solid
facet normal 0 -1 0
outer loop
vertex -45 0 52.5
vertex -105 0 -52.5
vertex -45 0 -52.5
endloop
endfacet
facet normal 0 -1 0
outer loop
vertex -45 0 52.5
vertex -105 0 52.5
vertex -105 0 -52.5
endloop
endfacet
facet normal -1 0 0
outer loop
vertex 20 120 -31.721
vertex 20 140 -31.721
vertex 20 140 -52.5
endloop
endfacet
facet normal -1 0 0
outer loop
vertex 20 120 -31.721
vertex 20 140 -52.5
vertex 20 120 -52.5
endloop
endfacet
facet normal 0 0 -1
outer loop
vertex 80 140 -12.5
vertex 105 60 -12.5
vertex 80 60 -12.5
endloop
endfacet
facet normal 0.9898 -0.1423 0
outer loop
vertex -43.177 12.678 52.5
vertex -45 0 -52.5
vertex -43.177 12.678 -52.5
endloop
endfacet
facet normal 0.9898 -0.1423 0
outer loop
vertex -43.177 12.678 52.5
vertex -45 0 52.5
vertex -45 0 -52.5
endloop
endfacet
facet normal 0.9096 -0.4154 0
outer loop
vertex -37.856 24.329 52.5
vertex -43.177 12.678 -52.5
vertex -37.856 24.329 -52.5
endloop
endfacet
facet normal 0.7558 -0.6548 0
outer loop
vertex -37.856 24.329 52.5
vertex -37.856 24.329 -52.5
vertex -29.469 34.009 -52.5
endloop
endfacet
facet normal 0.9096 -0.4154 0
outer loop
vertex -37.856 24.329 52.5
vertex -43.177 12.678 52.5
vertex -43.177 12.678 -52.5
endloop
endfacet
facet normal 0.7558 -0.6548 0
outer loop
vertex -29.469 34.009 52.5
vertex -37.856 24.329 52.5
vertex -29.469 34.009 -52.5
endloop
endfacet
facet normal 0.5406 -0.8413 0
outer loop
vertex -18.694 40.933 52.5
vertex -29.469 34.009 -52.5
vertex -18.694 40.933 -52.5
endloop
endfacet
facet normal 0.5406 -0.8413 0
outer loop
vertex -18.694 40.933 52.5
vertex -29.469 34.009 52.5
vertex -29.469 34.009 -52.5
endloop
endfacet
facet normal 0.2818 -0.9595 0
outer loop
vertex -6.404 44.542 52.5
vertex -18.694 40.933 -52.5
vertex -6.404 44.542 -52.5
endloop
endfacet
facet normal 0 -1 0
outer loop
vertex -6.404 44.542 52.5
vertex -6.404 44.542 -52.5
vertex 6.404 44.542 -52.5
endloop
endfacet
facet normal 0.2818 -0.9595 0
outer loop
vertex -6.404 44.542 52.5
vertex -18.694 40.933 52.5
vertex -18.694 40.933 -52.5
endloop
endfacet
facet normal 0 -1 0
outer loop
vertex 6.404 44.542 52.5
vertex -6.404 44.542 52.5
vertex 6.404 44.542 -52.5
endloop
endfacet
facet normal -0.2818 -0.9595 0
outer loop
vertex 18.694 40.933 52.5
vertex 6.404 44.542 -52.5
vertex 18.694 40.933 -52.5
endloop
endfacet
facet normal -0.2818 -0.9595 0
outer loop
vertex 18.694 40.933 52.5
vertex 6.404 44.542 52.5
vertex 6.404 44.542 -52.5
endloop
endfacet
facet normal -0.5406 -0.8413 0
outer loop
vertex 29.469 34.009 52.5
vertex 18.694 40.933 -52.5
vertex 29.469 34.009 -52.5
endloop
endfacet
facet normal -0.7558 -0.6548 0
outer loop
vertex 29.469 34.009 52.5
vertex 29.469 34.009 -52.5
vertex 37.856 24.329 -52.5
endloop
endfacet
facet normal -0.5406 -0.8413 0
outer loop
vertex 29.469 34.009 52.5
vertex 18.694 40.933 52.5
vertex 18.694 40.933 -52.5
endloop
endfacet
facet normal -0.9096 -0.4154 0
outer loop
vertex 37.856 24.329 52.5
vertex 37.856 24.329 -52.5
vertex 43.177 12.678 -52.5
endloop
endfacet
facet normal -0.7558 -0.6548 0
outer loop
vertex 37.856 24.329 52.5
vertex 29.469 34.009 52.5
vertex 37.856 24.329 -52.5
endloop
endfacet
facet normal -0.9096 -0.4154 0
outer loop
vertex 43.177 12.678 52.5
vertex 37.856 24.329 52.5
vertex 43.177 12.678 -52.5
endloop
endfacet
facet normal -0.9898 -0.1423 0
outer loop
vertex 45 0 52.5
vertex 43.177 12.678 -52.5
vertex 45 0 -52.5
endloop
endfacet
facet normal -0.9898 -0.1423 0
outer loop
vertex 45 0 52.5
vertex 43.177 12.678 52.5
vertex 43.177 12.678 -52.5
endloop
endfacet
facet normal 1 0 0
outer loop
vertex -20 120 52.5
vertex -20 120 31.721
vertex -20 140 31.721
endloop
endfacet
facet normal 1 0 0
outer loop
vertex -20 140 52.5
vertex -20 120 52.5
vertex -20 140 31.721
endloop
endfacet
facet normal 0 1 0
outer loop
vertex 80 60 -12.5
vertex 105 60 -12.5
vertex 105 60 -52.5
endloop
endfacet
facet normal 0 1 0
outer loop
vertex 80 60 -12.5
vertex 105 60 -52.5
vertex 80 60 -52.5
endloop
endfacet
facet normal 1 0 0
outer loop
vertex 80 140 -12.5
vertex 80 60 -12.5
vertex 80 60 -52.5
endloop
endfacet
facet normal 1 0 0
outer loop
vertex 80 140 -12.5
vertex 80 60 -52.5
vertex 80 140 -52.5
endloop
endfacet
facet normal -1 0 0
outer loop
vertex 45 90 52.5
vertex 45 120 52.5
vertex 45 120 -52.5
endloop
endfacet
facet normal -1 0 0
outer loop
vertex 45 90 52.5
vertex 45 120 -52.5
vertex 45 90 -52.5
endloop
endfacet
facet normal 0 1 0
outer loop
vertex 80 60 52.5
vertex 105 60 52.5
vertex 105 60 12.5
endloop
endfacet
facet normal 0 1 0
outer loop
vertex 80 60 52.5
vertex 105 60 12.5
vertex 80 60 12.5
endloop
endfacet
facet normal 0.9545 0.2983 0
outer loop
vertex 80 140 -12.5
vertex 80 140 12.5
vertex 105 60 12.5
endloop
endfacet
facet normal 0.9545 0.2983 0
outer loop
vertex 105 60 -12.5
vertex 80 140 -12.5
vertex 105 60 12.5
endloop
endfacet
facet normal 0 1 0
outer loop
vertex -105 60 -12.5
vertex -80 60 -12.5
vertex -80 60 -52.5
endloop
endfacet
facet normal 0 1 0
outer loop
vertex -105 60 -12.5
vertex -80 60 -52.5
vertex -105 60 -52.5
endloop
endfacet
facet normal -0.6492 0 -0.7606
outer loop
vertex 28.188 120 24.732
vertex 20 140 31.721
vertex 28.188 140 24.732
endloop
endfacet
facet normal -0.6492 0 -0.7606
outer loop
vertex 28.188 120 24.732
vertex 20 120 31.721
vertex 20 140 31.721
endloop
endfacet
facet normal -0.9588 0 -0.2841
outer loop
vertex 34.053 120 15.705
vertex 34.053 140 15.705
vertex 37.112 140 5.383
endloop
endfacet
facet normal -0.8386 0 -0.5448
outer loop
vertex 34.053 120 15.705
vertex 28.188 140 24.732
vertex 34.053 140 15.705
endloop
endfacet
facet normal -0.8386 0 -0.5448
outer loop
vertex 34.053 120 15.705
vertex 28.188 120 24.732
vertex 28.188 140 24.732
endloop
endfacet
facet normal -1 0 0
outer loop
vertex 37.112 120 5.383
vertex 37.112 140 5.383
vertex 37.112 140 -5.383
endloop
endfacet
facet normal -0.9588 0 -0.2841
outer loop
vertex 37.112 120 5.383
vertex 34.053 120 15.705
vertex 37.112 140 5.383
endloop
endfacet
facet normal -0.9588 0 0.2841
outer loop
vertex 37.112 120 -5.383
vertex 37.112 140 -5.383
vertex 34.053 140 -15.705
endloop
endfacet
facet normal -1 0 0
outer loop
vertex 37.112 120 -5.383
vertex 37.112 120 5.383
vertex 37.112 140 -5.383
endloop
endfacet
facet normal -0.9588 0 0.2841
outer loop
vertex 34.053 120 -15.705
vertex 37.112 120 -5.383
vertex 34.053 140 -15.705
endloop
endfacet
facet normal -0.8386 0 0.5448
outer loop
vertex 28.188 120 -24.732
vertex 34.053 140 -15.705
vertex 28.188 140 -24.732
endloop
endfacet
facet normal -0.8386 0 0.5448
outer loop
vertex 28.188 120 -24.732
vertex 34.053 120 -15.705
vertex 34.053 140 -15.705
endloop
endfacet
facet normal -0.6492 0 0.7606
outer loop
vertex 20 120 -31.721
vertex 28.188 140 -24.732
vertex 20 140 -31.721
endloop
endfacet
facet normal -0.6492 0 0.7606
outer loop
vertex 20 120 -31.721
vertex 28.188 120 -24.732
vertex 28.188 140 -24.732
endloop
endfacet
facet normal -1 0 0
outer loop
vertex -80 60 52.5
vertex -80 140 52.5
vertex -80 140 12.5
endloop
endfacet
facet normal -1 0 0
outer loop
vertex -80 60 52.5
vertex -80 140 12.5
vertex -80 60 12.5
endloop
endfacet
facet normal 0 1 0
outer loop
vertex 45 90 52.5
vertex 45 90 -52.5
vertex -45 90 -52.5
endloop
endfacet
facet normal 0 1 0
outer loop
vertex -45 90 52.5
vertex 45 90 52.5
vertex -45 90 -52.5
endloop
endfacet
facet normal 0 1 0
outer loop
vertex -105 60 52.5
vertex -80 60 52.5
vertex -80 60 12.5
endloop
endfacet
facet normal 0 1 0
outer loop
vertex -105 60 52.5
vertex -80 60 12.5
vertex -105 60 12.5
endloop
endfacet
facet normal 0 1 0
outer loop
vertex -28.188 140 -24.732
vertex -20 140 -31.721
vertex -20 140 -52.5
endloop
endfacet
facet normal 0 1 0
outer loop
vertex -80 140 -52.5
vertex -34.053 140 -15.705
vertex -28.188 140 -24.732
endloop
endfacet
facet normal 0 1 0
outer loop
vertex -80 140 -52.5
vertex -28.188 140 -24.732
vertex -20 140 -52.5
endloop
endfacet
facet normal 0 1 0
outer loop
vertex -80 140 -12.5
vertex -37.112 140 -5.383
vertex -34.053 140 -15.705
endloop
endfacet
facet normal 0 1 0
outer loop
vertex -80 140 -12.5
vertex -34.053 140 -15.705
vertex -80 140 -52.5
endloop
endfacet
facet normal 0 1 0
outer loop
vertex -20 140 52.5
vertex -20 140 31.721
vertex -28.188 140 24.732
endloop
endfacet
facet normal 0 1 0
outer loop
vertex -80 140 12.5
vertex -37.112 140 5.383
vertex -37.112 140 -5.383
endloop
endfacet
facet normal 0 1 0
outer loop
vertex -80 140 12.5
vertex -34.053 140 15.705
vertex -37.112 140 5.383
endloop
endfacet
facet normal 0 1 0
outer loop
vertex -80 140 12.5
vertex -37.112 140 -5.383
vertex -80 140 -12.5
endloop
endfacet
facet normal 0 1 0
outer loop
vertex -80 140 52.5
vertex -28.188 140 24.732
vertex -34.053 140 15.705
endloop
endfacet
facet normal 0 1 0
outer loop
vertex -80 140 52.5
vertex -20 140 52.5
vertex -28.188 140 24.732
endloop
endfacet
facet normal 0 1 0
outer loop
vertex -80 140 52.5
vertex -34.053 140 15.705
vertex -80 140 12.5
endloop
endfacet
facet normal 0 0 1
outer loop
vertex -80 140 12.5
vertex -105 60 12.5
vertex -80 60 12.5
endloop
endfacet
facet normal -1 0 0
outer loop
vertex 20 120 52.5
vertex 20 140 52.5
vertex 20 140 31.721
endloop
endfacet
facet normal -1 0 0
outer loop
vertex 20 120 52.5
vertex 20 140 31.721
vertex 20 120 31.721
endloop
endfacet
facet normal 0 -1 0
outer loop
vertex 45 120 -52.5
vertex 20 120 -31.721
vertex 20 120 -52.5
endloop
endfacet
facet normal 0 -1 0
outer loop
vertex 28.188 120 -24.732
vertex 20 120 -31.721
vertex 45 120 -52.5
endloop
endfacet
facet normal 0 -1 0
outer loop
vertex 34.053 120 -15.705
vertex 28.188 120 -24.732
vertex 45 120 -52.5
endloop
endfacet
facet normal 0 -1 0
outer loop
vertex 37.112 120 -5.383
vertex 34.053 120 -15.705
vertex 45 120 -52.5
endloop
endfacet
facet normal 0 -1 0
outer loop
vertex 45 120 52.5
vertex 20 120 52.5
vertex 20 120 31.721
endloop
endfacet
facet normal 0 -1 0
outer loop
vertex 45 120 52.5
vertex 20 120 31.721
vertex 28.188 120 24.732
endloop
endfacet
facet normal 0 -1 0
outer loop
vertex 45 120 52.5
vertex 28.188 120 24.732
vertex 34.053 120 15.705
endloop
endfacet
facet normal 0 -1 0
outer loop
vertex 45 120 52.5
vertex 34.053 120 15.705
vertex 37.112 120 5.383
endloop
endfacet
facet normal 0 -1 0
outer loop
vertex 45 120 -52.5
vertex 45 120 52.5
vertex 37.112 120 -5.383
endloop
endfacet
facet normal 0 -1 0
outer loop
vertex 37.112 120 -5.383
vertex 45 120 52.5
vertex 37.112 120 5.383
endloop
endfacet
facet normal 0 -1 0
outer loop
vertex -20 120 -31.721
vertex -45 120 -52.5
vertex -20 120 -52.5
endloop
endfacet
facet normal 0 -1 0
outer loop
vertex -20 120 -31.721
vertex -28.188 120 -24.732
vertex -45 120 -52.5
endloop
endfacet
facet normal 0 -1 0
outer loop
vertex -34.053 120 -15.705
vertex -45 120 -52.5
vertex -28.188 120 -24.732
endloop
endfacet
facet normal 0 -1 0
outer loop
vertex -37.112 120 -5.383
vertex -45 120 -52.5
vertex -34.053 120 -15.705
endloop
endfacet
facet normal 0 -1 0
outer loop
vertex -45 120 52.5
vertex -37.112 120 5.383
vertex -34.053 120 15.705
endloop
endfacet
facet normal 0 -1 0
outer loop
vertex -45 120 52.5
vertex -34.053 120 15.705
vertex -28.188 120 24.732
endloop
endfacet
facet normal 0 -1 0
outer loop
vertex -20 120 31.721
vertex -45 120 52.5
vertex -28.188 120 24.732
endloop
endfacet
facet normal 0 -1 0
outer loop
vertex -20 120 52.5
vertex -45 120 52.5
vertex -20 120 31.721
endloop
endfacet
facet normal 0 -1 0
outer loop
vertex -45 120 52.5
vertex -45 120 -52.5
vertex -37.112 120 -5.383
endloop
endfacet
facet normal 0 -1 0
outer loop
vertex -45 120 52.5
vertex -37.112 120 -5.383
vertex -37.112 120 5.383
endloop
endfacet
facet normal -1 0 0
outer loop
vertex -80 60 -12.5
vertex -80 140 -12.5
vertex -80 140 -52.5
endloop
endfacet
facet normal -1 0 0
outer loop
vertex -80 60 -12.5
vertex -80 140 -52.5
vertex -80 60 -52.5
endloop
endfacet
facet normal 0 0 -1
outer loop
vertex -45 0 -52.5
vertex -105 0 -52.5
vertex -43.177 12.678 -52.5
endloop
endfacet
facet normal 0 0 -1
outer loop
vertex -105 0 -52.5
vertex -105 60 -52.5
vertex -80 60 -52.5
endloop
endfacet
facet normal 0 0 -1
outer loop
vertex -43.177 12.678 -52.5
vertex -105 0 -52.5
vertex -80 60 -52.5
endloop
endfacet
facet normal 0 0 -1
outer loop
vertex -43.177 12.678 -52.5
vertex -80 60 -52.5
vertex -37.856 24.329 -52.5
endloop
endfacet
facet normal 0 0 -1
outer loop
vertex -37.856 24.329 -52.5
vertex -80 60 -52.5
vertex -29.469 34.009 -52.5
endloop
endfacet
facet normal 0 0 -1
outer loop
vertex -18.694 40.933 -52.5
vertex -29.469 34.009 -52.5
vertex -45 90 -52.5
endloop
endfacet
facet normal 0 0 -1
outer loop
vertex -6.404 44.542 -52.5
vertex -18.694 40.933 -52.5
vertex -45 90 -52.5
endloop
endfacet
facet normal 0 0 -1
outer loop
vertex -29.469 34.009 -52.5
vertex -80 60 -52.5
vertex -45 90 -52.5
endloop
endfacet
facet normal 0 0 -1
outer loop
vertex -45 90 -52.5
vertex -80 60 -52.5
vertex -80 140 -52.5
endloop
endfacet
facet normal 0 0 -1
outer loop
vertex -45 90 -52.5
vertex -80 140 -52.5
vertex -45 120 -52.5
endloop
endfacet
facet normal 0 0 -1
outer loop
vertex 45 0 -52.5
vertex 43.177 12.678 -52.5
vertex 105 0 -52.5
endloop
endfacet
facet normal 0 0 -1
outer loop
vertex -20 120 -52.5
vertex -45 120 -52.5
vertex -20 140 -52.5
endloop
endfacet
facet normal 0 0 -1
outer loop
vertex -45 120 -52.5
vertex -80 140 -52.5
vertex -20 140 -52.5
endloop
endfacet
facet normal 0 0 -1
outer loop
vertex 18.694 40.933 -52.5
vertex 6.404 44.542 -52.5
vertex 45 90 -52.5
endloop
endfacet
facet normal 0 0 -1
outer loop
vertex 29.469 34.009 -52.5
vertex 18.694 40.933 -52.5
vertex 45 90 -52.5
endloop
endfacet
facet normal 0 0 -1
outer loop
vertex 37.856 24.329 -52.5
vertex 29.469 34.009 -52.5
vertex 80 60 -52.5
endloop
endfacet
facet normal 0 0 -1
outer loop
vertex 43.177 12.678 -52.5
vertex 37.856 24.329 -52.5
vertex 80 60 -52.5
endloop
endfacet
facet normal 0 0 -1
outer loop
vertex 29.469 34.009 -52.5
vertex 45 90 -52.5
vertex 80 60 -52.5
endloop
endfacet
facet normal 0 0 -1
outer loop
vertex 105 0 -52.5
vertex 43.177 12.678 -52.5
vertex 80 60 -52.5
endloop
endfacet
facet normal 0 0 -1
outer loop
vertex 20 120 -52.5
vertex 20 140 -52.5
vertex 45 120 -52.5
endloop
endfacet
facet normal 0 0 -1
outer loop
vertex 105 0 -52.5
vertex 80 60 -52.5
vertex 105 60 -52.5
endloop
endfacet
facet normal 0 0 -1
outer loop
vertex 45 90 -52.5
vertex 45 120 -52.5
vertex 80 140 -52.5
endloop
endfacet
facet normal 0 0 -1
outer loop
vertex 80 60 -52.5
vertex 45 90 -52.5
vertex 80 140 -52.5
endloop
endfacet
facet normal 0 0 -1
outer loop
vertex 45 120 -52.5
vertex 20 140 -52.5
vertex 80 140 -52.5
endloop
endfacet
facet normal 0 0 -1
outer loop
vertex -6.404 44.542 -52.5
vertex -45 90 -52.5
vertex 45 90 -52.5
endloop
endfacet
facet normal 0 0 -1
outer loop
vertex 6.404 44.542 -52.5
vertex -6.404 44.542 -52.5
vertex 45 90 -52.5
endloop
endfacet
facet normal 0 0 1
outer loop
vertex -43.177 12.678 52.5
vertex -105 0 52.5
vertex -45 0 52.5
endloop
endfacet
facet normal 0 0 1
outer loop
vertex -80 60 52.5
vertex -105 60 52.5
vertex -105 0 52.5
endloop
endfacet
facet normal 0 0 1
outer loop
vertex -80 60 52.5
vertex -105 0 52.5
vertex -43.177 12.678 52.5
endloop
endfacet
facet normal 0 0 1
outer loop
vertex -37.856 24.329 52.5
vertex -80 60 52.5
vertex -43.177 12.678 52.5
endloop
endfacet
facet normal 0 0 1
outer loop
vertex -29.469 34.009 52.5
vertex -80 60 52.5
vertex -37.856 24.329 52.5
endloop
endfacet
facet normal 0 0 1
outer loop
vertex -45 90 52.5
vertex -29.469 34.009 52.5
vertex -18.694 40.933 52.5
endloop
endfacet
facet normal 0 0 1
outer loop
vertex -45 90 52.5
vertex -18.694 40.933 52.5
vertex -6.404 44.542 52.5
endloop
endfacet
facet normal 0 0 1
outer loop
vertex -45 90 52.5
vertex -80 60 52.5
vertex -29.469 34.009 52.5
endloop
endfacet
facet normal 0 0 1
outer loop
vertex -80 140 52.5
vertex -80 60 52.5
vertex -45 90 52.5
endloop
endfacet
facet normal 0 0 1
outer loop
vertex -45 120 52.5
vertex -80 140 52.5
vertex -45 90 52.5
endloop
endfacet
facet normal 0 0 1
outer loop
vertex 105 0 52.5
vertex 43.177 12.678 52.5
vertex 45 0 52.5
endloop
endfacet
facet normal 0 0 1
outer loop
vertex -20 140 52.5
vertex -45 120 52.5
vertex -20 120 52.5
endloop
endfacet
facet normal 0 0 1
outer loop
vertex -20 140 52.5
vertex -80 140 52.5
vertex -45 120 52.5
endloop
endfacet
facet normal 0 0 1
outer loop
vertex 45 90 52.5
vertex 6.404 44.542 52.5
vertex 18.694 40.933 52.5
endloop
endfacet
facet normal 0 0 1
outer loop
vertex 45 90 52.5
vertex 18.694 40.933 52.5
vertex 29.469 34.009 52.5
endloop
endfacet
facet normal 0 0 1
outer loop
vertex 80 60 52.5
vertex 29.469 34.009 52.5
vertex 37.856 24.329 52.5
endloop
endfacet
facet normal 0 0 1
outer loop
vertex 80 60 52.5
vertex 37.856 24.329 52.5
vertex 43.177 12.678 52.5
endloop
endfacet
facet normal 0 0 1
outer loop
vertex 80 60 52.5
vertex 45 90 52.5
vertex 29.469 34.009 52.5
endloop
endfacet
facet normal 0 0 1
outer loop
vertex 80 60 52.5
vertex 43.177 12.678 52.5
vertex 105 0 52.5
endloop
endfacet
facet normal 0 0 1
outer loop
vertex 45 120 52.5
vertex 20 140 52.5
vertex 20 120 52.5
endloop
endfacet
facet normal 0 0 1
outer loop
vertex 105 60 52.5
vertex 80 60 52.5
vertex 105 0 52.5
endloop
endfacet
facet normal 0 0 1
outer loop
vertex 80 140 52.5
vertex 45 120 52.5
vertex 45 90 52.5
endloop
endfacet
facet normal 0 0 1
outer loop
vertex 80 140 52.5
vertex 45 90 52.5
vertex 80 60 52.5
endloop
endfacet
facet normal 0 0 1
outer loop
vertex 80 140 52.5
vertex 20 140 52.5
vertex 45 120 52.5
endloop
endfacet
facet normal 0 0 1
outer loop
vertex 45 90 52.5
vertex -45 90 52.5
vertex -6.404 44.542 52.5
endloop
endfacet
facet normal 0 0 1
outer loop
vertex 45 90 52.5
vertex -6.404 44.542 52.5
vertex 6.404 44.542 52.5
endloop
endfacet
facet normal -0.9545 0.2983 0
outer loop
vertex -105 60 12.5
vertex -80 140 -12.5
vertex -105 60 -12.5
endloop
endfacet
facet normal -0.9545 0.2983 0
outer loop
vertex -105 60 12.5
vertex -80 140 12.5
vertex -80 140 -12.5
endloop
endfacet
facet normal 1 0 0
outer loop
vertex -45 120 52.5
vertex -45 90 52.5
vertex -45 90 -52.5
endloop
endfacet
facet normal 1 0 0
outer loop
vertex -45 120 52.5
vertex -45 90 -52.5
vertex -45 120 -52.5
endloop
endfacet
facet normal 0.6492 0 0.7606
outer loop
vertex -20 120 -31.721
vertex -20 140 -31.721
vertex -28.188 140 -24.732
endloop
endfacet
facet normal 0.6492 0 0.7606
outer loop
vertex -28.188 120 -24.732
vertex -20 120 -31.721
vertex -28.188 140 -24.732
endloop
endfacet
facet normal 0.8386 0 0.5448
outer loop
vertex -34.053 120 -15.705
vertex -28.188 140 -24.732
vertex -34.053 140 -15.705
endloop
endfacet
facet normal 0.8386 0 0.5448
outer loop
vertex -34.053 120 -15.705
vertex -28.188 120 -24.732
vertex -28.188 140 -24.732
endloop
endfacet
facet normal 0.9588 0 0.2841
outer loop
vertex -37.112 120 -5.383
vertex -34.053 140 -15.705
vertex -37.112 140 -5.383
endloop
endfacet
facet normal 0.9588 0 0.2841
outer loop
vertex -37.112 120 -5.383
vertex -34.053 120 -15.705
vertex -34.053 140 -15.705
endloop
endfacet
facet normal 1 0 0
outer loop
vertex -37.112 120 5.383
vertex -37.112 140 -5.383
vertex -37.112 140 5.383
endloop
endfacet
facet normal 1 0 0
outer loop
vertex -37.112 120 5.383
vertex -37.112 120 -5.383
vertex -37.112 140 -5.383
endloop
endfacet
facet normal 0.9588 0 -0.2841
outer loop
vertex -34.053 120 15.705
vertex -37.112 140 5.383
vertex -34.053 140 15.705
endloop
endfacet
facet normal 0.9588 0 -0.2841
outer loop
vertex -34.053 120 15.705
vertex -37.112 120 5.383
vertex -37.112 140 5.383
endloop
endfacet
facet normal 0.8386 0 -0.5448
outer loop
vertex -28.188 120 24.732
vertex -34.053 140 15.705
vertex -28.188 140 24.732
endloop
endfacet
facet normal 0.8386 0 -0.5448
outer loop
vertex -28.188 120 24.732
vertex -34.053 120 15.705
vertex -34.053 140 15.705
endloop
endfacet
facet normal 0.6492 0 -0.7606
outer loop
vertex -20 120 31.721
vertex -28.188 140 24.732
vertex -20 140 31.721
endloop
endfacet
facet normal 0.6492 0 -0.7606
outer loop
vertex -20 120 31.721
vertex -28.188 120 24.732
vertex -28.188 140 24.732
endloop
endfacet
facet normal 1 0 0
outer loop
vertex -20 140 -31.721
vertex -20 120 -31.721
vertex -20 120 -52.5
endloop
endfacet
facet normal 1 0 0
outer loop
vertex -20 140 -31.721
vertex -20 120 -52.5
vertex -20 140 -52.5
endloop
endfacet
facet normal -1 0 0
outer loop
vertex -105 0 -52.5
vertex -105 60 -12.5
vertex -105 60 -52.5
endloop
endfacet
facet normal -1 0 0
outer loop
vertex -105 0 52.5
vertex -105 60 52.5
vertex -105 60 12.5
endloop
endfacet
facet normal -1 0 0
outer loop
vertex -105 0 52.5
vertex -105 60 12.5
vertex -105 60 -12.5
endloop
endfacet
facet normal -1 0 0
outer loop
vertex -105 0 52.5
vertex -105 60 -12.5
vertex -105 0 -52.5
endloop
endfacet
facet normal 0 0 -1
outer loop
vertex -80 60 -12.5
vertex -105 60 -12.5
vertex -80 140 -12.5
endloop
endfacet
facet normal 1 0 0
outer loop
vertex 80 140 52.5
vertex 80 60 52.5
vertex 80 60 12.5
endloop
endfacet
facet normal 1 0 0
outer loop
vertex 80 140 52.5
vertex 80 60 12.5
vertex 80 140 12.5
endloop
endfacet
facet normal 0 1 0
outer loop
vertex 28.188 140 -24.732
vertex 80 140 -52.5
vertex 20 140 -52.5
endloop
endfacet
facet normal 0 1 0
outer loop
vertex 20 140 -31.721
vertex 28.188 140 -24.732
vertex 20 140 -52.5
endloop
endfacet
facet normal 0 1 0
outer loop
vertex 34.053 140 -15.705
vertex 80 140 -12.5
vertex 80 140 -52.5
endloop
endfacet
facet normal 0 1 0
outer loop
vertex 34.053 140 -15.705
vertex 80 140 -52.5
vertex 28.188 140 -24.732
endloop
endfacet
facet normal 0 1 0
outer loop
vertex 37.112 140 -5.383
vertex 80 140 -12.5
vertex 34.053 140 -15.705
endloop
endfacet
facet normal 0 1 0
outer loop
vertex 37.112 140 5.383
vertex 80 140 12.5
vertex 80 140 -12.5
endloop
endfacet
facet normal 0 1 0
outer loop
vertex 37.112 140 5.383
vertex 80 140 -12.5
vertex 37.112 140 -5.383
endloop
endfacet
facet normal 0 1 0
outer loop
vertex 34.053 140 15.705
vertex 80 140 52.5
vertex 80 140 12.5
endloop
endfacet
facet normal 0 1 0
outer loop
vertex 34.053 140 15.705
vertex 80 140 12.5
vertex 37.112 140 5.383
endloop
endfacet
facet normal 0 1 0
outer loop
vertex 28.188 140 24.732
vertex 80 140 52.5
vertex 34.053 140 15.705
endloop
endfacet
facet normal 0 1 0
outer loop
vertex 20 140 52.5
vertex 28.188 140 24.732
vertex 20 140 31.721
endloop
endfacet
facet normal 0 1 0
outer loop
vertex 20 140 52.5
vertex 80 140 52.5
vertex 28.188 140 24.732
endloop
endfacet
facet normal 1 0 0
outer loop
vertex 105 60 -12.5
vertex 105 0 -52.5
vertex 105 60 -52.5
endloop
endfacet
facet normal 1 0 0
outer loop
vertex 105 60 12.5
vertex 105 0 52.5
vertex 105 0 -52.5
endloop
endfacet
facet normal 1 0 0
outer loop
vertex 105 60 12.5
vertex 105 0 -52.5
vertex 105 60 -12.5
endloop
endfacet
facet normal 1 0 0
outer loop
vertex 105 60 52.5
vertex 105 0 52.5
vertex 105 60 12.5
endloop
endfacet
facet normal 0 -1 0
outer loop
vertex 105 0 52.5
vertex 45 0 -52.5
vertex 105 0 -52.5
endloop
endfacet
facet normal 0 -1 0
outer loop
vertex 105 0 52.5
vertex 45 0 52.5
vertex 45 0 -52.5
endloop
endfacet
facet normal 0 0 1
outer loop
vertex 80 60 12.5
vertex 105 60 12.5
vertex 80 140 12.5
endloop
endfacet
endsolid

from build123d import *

# Parameters (mm, degrees)
BOSS_EXTRUDE1_DEPTH = 52.5
CUT_EXTRUDE1_START  = -20
SKETCH2_R           = 37.5
CUT_EXTRUDE1_DEPTH  = 20
BOSS_EXTRUDE2_DEPTH = 12.5
BOSS_EXTRUDE3_DEPTH = 12.5


with BuildPart() as part:
    # Sketch1 → Boss-Extrude1 (new body, symmetric)
    with BuildSketch(Plane.XY):
        with BuildLine():
            Line((45, 0), (105, 0))
            Line((105, 0), (105, 60))
            Line((105, 60), (80, 60))
            Line((80, 60), (80, 140))
            Line((80, 140), (20, 140))
            Line((20, 140), (20, 120))
            Line((20, 120), (45, 120))
            Line((45, 120), (45, 90))
            Line((45, 90), (-45, 90))
            Line((-45, 90), (-45, 120))
            Line((-45, 120), (-20, 120))
            Line((-20, 120), (-20, 140))
            Line((-20, 140), (-80, 140))
            Line((-80, 140), (-80, 60))
            Line((-80, 60), (-105, 60))
            Line((-105, 60), (-105, 0))
            Line((-105, 0), (-45, 0))
            ThreePointArc((-45, 0), (0, 45), (45, 0))
        make_face()
    extrude(amount=BOSS_EXTRUDE1_DEPTH, both=True)

    # Sketch2 → Cut-Extrude1 (cut)
    with BuildSketch(Plane(origin=(0, 140, 0), x_dir=(1, 0, 0), z_dir=(0, 1, 0)).offset(CUT_EXTRUDE1_START)):
        Circle(SKETCH2_R)
    extrude(amount=CUT_EXTRUDE1_DEPTH, mode=Mode.SUBTRACT)

    # Sketch3 → Boss-Extrude2 (add, symmetric)
    with BuildSketch(Plane.XY):
        Polygon((105, 60), (80, 60), (80, 140), align=None)
    extrude(amount=BOSS_EXTRUDE2_DEPTH, both=True)

    # Sketch4 → Boss-Extrude3 (add, symmetric)
    with BuildSketch(Plane.XY):
        Polygon((-105, 60), (-80, 60), (-80, 140), align=None)
    extrude(amount=BOSS_EXTRUDE3_DEPTH, both=True)


solid = part.part
